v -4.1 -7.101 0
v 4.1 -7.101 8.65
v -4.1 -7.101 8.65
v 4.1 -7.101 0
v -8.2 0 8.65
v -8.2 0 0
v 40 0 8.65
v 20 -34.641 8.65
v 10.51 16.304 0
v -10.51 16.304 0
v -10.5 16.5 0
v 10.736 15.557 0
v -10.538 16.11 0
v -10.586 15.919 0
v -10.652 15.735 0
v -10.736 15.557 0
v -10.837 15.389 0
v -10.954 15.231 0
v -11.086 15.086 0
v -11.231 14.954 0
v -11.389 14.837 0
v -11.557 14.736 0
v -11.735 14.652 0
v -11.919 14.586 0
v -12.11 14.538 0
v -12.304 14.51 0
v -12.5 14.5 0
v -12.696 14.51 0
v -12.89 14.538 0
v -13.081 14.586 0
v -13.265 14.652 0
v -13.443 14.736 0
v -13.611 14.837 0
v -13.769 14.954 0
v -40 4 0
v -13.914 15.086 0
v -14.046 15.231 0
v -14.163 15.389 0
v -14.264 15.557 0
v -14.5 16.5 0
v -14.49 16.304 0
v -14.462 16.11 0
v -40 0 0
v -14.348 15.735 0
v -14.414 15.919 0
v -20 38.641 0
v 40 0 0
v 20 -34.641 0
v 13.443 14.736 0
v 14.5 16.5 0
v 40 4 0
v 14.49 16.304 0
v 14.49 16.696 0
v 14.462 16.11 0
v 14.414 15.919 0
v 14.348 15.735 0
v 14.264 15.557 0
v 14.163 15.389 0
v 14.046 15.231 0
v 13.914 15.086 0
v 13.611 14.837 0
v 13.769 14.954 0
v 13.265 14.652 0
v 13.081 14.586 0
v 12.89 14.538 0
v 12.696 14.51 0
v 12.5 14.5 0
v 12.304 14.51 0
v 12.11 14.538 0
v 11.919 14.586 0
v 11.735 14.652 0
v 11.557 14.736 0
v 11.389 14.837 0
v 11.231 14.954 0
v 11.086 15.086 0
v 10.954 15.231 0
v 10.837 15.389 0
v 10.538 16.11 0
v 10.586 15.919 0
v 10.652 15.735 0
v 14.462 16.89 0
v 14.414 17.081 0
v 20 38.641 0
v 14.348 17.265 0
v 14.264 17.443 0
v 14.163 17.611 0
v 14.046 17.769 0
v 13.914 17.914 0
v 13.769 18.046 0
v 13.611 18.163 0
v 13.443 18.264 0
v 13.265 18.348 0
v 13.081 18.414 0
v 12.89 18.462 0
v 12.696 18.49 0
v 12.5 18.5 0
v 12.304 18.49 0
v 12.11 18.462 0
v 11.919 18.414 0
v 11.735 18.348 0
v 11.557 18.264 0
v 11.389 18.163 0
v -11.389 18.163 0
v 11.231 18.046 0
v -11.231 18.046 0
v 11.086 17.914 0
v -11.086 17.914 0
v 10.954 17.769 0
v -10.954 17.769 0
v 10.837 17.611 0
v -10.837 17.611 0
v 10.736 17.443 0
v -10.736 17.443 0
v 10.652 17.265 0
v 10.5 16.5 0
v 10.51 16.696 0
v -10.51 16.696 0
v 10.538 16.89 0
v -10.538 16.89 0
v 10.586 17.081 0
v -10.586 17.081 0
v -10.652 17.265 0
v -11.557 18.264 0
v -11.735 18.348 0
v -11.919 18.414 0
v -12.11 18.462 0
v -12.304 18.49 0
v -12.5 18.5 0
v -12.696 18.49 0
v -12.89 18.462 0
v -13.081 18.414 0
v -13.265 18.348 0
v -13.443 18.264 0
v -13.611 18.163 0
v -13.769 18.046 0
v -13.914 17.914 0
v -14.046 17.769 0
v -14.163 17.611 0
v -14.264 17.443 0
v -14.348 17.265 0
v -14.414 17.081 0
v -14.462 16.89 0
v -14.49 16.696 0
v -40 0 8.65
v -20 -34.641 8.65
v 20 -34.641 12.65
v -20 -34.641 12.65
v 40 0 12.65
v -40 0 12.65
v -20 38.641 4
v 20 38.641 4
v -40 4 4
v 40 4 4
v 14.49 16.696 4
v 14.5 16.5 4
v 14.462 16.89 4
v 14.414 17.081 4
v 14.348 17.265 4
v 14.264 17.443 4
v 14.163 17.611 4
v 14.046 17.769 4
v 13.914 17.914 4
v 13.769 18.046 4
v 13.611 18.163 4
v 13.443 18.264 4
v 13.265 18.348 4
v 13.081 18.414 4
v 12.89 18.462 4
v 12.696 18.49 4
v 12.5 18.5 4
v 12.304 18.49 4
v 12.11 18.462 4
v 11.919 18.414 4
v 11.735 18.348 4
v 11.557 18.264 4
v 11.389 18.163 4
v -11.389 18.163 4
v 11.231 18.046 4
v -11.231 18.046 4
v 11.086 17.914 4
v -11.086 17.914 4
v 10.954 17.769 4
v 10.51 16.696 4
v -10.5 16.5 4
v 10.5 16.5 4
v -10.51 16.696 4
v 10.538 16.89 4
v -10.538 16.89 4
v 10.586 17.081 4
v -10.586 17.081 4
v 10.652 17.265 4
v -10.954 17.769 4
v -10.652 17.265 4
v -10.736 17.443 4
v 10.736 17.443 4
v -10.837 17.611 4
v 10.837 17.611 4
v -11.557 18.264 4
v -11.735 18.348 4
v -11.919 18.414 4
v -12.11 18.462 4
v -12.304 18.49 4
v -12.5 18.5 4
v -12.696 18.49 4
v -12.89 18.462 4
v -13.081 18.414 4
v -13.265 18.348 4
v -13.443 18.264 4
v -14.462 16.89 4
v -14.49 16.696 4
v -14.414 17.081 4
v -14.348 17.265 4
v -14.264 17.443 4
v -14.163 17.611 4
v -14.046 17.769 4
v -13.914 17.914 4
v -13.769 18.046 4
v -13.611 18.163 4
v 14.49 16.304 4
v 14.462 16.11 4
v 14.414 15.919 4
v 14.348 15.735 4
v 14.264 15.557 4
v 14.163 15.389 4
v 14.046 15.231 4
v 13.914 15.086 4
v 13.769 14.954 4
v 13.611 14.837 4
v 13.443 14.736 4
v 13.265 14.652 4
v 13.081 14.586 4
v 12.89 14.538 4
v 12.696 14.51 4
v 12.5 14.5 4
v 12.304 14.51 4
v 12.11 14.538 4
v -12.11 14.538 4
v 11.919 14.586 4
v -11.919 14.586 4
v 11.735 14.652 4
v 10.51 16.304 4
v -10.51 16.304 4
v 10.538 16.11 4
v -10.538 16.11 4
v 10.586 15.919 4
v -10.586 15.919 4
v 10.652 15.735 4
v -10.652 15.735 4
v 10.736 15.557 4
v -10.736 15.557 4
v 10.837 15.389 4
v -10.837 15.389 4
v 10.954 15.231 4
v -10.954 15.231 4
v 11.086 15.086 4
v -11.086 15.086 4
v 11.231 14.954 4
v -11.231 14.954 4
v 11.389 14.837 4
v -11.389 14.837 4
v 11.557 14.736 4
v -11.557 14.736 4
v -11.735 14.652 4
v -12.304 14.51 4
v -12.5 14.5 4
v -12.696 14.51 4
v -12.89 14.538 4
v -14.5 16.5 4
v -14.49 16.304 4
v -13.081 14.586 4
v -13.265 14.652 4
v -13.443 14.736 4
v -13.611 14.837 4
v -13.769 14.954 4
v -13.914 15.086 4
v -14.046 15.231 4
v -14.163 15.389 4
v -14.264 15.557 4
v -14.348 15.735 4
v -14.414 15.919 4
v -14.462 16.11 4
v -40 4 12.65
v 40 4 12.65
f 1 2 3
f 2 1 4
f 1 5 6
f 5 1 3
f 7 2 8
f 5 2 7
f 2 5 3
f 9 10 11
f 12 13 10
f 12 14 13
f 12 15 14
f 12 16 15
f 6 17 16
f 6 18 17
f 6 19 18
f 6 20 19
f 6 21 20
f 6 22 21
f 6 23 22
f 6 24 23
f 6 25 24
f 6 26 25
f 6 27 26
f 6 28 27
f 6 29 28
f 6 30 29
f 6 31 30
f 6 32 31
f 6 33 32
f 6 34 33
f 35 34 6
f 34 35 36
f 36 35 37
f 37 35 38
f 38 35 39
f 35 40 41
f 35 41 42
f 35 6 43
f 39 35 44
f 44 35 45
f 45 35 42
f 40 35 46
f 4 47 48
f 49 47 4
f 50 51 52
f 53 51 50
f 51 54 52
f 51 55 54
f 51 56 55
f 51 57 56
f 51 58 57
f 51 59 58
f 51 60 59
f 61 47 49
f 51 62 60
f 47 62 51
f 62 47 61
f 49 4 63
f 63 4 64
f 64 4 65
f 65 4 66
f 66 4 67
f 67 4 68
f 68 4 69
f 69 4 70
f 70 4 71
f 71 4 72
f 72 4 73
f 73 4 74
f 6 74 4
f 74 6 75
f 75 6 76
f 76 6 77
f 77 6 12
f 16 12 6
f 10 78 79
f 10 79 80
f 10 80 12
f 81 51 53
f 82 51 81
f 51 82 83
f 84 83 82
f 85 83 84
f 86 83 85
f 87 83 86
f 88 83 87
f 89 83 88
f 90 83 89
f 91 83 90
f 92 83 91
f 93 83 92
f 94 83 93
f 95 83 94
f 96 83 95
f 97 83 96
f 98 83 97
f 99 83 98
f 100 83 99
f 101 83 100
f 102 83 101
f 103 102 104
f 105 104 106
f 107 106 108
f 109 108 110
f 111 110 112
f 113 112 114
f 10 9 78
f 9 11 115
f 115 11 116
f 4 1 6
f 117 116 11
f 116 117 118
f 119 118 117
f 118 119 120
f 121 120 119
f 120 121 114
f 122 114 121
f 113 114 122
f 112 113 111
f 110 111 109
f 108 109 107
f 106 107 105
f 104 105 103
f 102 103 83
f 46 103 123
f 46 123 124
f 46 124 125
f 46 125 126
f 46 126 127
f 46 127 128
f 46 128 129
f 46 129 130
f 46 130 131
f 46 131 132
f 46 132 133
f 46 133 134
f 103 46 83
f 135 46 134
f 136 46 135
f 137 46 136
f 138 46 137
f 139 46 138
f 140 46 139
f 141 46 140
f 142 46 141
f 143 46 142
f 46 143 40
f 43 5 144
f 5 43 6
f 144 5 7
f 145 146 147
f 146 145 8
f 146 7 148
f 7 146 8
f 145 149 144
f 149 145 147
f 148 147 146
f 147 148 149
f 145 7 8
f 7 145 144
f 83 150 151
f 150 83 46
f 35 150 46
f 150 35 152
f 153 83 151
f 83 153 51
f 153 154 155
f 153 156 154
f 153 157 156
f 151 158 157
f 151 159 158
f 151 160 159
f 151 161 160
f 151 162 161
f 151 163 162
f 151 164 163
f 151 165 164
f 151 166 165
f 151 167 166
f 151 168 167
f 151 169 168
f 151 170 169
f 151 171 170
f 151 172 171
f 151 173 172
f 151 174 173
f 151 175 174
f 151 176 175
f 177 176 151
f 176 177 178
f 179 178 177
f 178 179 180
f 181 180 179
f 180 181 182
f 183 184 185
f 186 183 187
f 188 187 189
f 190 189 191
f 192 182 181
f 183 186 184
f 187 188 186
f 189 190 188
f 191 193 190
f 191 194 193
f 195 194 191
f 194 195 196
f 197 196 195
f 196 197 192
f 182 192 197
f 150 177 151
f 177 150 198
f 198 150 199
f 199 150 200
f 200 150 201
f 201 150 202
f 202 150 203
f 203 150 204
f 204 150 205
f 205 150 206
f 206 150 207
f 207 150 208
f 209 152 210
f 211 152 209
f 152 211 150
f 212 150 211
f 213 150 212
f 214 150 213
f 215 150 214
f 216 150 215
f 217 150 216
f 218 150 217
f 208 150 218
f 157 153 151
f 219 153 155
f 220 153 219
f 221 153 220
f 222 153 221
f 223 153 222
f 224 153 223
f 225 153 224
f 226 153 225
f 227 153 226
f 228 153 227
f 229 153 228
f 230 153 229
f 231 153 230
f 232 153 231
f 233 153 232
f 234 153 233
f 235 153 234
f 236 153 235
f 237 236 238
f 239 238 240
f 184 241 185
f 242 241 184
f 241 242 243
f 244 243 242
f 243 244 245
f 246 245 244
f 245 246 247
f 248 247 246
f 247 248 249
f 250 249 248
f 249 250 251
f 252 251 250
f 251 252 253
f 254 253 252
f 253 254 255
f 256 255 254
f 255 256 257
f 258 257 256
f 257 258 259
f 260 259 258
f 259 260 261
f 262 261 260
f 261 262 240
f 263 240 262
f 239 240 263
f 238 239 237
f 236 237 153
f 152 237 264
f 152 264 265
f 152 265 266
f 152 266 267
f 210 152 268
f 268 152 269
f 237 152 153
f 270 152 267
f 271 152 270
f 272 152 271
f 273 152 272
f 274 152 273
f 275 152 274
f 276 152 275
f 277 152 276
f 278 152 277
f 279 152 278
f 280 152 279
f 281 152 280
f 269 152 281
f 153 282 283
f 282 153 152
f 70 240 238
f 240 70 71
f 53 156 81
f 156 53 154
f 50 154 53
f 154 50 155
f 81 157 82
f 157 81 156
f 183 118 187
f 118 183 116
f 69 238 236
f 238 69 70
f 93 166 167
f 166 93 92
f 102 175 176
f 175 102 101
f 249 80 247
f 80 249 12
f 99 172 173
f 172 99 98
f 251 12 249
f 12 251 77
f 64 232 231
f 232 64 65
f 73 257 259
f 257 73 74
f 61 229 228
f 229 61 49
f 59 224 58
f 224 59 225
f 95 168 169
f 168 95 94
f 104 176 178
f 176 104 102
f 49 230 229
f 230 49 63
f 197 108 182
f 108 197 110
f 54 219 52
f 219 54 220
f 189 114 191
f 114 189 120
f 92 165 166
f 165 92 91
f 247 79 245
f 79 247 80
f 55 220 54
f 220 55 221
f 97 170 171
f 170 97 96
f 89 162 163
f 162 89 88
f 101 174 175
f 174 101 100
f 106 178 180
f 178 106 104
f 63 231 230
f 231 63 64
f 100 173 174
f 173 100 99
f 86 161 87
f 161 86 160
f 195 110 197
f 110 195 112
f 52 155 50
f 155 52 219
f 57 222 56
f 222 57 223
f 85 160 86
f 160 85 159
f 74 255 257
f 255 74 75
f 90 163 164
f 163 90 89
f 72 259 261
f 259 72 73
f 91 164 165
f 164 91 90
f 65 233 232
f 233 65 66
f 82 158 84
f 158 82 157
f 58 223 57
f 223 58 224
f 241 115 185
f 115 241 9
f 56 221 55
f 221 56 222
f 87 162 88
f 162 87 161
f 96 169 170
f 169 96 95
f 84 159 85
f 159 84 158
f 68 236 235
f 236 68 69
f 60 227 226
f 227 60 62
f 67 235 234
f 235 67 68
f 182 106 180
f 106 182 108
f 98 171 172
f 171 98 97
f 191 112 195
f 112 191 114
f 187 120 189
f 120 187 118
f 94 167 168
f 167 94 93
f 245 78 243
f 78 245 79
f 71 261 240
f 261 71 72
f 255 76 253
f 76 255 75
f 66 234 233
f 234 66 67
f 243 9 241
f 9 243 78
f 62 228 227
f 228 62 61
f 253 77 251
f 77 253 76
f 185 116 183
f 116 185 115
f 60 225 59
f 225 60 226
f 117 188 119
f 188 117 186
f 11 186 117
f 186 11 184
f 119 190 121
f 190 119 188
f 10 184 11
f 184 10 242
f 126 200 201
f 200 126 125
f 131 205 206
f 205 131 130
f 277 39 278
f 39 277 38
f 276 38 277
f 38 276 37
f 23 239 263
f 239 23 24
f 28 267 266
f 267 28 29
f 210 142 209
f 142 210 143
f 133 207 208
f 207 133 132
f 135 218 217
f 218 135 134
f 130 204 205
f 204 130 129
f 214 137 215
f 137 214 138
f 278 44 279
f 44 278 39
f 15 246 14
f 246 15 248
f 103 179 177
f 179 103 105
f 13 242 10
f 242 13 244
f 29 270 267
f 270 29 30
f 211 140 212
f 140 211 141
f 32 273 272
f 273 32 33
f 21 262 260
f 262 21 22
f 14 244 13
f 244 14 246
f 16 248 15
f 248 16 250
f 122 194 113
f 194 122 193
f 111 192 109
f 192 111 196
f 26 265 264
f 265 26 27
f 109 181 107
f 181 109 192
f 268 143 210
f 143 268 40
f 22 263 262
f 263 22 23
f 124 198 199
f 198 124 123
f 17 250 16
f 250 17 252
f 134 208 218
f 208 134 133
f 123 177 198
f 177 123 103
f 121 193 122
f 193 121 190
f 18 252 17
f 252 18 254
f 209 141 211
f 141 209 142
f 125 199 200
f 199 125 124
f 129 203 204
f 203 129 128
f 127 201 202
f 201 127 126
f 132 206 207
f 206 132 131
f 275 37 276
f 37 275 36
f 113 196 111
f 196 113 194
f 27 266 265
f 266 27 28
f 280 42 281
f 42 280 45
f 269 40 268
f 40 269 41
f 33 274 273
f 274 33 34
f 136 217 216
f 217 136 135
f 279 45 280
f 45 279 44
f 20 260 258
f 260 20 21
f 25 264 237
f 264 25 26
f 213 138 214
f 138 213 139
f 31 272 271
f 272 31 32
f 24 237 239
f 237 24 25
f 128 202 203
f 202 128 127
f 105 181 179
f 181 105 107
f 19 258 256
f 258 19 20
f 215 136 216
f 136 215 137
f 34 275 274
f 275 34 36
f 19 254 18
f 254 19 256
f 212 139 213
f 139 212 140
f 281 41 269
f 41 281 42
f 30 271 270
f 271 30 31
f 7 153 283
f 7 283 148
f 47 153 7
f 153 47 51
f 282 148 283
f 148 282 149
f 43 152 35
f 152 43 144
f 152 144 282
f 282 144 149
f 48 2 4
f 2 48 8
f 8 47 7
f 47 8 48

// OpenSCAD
bracket_th = 4;
light_th = 8.65;
post_r = 8.2;
flat_r = 40;
light_w = 205;
screw_hole_r = 2;

module half_hex(h, r) {
  difference() {
    cylinder(h=h, r=r, $fn=6);
    translate([-r, 0, 0])
      cube([r * 2, r, h]);
  }
}

module middle() {
  half_hex(h=light_th, r=post_r);
  translate([0, 0, light_th])
    half_hex(h=bracket_th, r=flat_r);
  translate([0, bracket_th, 0])
    difference() {
      rotate([0, 0, 180])
        half_hex(h=bracket_th, r=flat_r);
      translate([ 12.5, 12.5, 0])
        cylinder(h=bracket_th, r=screw_hole_r, $fn=64);
      translate([-12.5, 12.5, 0])
        cylinder(h=bracket_th, r=screw_hole_r, $fn=64);
    }
  translate([-flat_r, 0, 0])
    cube([flat_r * 2, bracket_th, light_th + bracket_th]);
}

module end2() {
  middle();
  linear_extrude(light_th)
    polygon([
      [0, 0],
      [flat_r/2, -flat_r * sin(60)],
      [flat_r, 0]
    ]);
}

module end1() {
  middle();
  linear_extrude(light_th)
    polygon([
      [0, 0],
      [-flat_r/2, -flat_r * sin(60)],
      [flat_r/2, -flat_r * sin(60)],
      [flat_r, 0]
    ]);
}


// middle();
end2();
// end1();
